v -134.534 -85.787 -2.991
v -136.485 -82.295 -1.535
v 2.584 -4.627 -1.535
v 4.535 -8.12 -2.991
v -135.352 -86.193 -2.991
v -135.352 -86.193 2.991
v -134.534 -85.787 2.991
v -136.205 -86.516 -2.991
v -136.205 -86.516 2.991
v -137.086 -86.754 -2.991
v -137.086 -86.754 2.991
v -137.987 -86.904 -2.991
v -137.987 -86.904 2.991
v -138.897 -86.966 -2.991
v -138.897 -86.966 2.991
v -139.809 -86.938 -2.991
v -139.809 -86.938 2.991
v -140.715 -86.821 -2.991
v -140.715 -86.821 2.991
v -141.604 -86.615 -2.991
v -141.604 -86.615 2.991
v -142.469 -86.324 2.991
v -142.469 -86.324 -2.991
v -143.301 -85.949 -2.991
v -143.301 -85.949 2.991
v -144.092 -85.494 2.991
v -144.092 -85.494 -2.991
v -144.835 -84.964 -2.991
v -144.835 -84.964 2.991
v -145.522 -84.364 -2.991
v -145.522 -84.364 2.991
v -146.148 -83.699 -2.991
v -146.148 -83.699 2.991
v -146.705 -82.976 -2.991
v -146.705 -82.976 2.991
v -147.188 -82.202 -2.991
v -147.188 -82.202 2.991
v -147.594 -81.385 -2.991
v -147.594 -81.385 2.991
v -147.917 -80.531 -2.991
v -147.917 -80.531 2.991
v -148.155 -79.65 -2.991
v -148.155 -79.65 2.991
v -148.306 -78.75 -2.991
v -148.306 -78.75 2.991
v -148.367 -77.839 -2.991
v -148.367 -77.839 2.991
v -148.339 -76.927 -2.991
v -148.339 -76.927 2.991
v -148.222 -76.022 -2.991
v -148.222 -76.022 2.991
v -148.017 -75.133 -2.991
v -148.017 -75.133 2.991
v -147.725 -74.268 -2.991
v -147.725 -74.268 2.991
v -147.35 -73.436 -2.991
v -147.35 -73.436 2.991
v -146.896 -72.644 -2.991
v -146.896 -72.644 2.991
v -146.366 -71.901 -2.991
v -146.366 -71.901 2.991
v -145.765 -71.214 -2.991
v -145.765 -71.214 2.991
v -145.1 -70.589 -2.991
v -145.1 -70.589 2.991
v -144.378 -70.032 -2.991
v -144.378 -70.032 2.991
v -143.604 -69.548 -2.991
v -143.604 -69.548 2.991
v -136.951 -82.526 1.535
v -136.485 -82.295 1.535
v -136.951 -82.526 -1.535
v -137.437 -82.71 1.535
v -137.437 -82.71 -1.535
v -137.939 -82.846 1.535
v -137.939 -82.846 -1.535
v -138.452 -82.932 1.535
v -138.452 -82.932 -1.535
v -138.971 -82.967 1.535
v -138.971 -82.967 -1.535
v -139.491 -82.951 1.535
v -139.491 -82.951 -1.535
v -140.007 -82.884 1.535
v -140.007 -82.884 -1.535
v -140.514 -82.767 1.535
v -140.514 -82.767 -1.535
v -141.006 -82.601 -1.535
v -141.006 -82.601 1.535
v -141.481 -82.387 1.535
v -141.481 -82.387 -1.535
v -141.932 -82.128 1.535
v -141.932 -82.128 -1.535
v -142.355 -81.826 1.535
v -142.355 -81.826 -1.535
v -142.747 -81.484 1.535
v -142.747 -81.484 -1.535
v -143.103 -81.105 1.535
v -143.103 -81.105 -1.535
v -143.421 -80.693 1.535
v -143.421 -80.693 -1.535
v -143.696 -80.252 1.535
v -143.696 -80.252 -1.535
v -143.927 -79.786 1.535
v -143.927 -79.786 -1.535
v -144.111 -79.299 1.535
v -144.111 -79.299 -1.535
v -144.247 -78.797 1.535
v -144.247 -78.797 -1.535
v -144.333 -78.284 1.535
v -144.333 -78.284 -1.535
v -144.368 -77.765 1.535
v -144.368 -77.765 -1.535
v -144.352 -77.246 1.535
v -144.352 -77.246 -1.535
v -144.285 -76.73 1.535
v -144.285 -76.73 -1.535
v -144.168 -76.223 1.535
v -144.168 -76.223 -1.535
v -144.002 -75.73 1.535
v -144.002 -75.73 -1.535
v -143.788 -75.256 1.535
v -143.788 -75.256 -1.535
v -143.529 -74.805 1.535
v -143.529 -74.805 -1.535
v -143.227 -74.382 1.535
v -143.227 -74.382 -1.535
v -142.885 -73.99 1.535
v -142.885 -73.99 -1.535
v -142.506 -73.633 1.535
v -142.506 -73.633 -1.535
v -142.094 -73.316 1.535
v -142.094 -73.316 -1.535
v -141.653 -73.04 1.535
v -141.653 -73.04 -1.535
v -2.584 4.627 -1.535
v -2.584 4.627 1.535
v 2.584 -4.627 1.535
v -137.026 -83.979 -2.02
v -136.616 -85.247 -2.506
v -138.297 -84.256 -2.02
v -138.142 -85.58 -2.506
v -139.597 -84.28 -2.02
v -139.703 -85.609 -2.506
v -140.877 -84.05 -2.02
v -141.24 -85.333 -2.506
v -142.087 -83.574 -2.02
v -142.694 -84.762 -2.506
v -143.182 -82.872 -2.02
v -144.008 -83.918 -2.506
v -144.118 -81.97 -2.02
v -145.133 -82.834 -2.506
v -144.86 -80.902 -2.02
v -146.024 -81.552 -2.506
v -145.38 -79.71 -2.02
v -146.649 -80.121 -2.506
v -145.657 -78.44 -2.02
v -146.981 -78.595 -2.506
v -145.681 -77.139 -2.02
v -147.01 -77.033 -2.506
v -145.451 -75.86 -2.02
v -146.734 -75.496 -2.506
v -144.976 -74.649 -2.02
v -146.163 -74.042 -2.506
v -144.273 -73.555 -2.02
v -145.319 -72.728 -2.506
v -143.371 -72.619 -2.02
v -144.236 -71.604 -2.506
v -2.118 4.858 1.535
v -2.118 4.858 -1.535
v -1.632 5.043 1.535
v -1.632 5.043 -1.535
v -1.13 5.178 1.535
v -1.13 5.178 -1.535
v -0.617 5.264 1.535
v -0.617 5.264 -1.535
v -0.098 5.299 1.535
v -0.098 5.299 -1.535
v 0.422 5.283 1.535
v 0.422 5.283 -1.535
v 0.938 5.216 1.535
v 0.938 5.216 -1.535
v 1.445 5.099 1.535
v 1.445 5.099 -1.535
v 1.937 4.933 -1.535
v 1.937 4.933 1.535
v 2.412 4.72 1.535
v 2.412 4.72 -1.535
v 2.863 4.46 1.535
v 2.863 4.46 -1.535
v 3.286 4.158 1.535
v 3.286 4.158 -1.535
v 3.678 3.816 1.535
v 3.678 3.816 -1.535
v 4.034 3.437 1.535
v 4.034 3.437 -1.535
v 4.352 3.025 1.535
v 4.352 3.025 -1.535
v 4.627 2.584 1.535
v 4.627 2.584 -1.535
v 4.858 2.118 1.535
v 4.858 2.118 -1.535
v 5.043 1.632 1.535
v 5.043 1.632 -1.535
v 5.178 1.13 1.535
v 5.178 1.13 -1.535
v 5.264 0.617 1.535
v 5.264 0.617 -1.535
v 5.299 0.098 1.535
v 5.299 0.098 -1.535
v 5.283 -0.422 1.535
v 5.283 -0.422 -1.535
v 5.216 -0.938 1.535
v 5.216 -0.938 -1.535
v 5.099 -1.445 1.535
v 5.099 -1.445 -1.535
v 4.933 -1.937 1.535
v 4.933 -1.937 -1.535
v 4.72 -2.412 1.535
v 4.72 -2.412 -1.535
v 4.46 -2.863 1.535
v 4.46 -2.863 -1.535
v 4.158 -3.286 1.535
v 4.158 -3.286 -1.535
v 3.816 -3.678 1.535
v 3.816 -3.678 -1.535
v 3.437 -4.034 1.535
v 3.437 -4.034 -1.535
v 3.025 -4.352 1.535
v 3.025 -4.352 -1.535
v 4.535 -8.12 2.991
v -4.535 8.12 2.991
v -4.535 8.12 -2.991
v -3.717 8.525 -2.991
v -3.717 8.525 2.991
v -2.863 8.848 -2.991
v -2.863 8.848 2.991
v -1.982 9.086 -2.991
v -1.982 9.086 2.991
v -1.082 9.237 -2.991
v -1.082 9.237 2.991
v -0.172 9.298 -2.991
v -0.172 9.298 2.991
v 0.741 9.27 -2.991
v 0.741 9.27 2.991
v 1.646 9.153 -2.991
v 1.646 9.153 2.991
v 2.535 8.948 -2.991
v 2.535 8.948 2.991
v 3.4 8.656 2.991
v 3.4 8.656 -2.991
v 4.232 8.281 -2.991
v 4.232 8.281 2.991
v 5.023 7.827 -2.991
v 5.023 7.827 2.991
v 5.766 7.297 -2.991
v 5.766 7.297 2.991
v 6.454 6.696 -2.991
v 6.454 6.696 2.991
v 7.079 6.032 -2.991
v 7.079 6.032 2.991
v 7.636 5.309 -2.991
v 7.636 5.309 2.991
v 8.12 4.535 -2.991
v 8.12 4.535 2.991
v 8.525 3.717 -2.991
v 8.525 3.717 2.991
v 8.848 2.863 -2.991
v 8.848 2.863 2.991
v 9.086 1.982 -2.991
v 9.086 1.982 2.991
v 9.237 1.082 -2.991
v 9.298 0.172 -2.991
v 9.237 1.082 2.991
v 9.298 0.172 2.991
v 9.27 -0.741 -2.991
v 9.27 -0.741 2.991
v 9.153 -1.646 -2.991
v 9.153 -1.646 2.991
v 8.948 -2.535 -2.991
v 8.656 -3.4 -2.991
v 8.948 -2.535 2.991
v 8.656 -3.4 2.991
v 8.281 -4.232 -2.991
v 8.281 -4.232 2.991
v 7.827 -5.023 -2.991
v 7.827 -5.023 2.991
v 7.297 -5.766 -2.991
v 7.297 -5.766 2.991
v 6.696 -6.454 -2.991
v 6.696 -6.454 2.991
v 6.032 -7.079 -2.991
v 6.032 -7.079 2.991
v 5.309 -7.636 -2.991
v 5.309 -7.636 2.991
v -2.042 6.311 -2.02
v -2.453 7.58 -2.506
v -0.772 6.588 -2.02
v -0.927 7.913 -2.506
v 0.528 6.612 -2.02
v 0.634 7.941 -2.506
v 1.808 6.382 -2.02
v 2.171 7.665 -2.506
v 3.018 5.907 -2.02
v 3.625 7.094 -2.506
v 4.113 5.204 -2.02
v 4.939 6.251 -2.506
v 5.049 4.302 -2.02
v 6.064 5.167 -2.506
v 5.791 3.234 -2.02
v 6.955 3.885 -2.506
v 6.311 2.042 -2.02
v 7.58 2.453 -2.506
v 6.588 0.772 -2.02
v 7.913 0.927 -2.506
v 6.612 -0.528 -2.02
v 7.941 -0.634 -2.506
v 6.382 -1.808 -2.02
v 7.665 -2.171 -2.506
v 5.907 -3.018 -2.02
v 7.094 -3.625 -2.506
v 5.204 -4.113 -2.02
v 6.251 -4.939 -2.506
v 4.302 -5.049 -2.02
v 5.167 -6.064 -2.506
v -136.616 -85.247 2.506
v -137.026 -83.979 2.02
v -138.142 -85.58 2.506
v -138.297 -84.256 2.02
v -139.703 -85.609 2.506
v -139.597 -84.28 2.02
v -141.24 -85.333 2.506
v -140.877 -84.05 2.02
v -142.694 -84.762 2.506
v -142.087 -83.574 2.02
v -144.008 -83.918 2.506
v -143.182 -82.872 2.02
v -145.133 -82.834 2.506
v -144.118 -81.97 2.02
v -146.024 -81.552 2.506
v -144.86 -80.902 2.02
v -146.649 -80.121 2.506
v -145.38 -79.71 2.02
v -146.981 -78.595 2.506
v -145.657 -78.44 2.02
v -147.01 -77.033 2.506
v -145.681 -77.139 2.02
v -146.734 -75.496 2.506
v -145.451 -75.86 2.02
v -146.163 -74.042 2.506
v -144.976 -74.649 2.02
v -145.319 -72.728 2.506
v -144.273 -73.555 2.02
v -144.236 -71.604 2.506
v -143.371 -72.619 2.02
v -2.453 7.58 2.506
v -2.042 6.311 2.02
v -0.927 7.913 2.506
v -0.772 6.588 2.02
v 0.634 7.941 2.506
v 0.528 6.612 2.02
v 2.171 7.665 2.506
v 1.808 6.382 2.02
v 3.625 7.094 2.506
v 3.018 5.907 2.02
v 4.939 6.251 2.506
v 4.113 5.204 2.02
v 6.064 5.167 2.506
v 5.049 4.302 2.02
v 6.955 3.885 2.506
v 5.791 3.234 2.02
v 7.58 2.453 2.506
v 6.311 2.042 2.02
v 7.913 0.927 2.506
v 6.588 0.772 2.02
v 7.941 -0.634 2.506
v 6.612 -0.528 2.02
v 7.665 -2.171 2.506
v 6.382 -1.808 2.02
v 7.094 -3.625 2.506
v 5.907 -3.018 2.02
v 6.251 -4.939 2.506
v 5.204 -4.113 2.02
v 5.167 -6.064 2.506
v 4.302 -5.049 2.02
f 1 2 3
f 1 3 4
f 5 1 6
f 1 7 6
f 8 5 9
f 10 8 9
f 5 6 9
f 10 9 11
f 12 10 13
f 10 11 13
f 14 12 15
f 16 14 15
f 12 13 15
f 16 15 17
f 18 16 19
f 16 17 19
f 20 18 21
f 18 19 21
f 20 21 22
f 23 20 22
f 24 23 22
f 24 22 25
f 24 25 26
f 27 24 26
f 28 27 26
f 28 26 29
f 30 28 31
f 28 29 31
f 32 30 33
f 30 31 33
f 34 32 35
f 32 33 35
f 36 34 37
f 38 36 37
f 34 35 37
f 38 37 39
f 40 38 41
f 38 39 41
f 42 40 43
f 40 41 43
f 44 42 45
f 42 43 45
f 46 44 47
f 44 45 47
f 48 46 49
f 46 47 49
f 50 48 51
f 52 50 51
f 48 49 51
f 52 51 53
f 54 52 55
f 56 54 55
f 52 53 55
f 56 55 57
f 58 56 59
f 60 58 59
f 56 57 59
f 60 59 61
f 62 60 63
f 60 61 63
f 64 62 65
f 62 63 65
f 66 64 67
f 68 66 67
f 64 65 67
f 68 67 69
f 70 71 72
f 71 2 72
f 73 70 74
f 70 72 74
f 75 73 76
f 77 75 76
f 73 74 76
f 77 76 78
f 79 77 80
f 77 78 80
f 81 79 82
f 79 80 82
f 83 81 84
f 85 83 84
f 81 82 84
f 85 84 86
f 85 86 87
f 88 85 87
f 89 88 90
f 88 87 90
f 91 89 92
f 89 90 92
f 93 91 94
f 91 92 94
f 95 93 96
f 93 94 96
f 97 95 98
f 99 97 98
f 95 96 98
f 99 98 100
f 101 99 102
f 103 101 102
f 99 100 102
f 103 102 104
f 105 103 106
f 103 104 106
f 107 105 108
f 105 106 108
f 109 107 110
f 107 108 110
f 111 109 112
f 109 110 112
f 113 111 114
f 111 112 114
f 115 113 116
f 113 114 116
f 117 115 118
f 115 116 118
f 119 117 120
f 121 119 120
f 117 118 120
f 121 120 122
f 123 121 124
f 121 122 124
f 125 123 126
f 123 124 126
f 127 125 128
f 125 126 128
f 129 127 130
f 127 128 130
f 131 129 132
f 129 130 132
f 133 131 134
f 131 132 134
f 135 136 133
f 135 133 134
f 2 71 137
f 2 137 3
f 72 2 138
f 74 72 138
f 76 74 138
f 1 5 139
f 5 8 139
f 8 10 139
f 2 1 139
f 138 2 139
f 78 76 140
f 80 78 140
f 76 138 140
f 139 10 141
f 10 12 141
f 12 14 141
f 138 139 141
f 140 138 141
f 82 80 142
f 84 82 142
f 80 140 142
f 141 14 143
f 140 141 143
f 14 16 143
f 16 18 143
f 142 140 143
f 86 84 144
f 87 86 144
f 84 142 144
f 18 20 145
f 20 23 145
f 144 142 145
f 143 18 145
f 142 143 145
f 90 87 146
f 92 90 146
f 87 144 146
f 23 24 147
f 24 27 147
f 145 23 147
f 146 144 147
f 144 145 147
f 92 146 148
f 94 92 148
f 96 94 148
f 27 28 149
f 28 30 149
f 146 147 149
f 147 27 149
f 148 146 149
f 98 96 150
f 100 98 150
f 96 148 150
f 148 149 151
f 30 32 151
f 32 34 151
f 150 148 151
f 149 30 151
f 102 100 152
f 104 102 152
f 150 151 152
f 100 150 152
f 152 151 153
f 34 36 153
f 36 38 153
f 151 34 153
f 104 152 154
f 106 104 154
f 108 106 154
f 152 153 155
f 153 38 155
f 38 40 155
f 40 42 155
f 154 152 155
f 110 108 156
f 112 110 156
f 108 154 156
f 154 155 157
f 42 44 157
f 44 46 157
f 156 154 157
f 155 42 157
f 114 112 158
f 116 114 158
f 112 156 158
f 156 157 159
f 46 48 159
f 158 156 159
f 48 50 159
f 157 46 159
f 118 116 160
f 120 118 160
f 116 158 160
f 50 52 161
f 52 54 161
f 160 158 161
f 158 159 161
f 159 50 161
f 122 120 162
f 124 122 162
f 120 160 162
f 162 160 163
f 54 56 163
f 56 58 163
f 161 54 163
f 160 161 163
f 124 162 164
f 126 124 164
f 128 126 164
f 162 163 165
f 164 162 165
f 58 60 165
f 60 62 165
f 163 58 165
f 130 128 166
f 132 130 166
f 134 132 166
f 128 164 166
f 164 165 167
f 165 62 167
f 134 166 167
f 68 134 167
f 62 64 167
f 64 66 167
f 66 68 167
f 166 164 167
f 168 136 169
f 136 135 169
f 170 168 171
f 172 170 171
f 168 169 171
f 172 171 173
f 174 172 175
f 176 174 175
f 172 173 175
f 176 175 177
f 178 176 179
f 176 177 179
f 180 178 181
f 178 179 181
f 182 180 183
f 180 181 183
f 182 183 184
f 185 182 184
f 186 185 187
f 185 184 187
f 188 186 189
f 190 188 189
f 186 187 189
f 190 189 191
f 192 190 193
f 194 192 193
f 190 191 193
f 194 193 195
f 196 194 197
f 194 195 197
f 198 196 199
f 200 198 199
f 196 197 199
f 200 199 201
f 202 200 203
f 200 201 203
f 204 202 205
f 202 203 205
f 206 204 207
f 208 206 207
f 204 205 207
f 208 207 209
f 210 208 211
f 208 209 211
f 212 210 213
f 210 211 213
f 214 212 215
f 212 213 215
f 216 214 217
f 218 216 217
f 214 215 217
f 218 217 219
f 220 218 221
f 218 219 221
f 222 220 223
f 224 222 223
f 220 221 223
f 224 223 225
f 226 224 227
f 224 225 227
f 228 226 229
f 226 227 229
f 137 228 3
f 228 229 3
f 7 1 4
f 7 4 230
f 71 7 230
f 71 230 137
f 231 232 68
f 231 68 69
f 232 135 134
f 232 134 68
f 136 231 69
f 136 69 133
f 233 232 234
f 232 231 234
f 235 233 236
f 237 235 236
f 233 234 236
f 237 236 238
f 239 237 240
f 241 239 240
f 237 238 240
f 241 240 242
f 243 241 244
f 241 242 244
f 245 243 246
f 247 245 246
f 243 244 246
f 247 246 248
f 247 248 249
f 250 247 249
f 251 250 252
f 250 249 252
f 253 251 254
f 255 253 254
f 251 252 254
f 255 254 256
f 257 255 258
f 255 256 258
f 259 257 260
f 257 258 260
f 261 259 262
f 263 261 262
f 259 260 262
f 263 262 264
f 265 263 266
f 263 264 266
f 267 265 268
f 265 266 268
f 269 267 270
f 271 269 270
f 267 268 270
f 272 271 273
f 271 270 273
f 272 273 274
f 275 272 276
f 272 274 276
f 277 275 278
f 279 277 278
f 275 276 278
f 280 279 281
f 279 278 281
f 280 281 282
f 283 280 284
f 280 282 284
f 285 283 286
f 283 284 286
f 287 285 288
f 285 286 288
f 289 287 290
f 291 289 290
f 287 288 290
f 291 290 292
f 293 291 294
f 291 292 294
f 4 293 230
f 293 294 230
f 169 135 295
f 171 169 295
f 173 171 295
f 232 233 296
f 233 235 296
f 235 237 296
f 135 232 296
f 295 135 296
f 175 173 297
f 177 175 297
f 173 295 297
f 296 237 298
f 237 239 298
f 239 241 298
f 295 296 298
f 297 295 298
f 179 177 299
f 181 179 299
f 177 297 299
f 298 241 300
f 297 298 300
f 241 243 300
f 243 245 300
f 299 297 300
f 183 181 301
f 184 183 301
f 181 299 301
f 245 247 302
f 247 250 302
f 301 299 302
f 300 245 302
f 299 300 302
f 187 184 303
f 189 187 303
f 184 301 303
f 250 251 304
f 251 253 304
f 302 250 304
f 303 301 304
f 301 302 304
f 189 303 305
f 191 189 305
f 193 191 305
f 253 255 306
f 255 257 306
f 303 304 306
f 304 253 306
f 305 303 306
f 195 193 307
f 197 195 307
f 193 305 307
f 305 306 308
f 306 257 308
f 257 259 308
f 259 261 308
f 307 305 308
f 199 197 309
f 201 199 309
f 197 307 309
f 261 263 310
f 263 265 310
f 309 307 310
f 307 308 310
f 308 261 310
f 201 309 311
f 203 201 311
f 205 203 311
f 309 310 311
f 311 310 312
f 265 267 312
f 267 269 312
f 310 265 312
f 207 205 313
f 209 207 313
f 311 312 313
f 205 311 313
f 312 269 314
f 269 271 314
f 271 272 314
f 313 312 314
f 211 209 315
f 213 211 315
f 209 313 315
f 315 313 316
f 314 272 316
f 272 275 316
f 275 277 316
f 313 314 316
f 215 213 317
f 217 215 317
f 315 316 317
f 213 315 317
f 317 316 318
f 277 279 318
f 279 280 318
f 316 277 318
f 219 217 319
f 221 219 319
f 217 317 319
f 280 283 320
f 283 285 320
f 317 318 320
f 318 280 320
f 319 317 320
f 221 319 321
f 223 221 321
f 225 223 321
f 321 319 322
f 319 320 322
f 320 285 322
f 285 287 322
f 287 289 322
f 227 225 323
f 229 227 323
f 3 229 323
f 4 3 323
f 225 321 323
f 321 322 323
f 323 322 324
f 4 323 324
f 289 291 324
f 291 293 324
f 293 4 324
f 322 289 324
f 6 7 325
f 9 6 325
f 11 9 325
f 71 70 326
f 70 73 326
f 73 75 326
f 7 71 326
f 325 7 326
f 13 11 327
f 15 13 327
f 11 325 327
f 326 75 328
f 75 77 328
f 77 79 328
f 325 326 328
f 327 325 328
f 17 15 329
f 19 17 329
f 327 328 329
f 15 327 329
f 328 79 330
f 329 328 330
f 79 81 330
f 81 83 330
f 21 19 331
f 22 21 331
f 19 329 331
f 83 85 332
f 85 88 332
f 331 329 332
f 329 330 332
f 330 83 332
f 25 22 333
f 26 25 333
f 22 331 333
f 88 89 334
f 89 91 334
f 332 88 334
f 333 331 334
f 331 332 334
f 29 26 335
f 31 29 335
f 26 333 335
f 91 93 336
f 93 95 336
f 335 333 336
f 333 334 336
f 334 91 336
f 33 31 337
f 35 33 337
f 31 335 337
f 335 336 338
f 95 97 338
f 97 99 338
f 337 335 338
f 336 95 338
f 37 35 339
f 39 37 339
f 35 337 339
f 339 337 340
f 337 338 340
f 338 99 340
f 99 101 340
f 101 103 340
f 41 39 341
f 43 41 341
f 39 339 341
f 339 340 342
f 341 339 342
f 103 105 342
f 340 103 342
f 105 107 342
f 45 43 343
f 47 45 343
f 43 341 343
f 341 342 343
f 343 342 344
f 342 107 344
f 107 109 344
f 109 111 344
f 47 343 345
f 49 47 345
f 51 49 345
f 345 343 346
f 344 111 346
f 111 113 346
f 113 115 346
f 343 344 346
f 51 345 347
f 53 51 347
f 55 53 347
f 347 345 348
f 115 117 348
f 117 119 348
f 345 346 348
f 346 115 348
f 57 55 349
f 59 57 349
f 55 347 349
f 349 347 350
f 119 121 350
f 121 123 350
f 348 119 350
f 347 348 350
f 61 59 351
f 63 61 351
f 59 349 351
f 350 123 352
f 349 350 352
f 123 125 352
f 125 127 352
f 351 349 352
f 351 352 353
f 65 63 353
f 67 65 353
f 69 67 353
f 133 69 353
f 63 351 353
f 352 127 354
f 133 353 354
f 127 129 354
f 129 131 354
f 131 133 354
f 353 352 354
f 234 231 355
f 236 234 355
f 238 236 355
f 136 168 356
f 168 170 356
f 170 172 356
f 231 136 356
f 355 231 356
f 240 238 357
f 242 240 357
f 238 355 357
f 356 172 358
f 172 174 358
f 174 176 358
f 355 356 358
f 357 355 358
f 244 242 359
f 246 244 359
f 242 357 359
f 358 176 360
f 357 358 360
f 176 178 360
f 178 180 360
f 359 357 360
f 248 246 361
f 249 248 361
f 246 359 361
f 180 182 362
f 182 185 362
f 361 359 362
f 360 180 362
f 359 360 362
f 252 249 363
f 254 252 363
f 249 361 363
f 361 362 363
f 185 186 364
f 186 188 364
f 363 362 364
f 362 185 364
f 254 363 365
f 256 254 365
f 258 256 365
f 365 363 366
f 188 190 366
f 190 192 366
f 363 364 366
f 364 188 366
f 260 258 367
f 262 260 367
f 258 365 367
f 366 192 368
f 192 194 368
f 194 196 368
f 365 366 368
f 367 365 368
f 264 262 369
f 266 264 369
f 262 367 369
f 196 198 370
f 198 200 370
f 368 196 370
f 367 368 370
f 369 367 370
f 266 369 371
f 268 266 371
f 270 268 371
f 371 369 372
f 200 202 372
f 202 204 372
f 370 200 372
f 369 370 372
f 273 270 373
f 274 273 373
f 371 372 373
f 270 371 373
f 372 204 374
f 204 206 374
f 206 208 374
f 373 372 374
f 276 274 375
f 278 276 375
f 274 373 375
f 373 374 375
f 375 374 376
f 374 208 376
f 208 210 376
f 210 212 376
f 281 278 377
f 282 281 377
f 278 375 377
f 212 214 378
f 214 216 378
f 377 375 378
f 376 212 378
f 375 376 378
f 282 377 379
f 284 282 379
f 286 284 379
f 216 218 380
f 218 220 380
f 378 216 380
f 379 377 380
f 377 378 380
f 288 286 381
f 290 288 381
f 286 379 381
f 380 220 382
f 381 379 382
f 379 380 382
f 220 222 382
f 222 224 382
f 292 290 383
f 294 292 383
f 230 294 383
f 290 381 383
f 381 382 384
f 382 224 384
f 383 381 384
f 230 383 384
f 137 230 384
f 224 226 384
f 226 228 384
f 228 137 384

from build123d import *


with BuildPart() as part:
    # 扫描1: sweep along a path in 草图2
    with BuildLine(Plane.XY) as sweep_1_path:
        Line((2.584252226, -4.627271381), (-136.48462728, -82.294871103))
        ThreePointArc((-136.48462728, -82.294871103), (-143.696150887, -80.251851948), (-141.653131732, -73.040328341))
        Line((-141.653131732, -73.040328341), (-2.584252226, 4.627271381))
        ThreePointArc((-2.584252226, 4.627271381), (4.627271381, 2.584252226), (2.584252226, -4.627271381))
    # 草图3 → 扫描1 (sweep)
    with BuildSketch(Plane(origin=(0, 0, 0), x_dir=(0, 0, -1), z_dir=(0.8730700718740267, 0.48759475960871657, 0))):
        Polygon((-1.535, 5.3), (1.535, 5.3), (2.990880937, 9.3), (-2.990880937, 9.3), align=None)
    sweep(path=sweep_1_path.line)


solid = part.part
